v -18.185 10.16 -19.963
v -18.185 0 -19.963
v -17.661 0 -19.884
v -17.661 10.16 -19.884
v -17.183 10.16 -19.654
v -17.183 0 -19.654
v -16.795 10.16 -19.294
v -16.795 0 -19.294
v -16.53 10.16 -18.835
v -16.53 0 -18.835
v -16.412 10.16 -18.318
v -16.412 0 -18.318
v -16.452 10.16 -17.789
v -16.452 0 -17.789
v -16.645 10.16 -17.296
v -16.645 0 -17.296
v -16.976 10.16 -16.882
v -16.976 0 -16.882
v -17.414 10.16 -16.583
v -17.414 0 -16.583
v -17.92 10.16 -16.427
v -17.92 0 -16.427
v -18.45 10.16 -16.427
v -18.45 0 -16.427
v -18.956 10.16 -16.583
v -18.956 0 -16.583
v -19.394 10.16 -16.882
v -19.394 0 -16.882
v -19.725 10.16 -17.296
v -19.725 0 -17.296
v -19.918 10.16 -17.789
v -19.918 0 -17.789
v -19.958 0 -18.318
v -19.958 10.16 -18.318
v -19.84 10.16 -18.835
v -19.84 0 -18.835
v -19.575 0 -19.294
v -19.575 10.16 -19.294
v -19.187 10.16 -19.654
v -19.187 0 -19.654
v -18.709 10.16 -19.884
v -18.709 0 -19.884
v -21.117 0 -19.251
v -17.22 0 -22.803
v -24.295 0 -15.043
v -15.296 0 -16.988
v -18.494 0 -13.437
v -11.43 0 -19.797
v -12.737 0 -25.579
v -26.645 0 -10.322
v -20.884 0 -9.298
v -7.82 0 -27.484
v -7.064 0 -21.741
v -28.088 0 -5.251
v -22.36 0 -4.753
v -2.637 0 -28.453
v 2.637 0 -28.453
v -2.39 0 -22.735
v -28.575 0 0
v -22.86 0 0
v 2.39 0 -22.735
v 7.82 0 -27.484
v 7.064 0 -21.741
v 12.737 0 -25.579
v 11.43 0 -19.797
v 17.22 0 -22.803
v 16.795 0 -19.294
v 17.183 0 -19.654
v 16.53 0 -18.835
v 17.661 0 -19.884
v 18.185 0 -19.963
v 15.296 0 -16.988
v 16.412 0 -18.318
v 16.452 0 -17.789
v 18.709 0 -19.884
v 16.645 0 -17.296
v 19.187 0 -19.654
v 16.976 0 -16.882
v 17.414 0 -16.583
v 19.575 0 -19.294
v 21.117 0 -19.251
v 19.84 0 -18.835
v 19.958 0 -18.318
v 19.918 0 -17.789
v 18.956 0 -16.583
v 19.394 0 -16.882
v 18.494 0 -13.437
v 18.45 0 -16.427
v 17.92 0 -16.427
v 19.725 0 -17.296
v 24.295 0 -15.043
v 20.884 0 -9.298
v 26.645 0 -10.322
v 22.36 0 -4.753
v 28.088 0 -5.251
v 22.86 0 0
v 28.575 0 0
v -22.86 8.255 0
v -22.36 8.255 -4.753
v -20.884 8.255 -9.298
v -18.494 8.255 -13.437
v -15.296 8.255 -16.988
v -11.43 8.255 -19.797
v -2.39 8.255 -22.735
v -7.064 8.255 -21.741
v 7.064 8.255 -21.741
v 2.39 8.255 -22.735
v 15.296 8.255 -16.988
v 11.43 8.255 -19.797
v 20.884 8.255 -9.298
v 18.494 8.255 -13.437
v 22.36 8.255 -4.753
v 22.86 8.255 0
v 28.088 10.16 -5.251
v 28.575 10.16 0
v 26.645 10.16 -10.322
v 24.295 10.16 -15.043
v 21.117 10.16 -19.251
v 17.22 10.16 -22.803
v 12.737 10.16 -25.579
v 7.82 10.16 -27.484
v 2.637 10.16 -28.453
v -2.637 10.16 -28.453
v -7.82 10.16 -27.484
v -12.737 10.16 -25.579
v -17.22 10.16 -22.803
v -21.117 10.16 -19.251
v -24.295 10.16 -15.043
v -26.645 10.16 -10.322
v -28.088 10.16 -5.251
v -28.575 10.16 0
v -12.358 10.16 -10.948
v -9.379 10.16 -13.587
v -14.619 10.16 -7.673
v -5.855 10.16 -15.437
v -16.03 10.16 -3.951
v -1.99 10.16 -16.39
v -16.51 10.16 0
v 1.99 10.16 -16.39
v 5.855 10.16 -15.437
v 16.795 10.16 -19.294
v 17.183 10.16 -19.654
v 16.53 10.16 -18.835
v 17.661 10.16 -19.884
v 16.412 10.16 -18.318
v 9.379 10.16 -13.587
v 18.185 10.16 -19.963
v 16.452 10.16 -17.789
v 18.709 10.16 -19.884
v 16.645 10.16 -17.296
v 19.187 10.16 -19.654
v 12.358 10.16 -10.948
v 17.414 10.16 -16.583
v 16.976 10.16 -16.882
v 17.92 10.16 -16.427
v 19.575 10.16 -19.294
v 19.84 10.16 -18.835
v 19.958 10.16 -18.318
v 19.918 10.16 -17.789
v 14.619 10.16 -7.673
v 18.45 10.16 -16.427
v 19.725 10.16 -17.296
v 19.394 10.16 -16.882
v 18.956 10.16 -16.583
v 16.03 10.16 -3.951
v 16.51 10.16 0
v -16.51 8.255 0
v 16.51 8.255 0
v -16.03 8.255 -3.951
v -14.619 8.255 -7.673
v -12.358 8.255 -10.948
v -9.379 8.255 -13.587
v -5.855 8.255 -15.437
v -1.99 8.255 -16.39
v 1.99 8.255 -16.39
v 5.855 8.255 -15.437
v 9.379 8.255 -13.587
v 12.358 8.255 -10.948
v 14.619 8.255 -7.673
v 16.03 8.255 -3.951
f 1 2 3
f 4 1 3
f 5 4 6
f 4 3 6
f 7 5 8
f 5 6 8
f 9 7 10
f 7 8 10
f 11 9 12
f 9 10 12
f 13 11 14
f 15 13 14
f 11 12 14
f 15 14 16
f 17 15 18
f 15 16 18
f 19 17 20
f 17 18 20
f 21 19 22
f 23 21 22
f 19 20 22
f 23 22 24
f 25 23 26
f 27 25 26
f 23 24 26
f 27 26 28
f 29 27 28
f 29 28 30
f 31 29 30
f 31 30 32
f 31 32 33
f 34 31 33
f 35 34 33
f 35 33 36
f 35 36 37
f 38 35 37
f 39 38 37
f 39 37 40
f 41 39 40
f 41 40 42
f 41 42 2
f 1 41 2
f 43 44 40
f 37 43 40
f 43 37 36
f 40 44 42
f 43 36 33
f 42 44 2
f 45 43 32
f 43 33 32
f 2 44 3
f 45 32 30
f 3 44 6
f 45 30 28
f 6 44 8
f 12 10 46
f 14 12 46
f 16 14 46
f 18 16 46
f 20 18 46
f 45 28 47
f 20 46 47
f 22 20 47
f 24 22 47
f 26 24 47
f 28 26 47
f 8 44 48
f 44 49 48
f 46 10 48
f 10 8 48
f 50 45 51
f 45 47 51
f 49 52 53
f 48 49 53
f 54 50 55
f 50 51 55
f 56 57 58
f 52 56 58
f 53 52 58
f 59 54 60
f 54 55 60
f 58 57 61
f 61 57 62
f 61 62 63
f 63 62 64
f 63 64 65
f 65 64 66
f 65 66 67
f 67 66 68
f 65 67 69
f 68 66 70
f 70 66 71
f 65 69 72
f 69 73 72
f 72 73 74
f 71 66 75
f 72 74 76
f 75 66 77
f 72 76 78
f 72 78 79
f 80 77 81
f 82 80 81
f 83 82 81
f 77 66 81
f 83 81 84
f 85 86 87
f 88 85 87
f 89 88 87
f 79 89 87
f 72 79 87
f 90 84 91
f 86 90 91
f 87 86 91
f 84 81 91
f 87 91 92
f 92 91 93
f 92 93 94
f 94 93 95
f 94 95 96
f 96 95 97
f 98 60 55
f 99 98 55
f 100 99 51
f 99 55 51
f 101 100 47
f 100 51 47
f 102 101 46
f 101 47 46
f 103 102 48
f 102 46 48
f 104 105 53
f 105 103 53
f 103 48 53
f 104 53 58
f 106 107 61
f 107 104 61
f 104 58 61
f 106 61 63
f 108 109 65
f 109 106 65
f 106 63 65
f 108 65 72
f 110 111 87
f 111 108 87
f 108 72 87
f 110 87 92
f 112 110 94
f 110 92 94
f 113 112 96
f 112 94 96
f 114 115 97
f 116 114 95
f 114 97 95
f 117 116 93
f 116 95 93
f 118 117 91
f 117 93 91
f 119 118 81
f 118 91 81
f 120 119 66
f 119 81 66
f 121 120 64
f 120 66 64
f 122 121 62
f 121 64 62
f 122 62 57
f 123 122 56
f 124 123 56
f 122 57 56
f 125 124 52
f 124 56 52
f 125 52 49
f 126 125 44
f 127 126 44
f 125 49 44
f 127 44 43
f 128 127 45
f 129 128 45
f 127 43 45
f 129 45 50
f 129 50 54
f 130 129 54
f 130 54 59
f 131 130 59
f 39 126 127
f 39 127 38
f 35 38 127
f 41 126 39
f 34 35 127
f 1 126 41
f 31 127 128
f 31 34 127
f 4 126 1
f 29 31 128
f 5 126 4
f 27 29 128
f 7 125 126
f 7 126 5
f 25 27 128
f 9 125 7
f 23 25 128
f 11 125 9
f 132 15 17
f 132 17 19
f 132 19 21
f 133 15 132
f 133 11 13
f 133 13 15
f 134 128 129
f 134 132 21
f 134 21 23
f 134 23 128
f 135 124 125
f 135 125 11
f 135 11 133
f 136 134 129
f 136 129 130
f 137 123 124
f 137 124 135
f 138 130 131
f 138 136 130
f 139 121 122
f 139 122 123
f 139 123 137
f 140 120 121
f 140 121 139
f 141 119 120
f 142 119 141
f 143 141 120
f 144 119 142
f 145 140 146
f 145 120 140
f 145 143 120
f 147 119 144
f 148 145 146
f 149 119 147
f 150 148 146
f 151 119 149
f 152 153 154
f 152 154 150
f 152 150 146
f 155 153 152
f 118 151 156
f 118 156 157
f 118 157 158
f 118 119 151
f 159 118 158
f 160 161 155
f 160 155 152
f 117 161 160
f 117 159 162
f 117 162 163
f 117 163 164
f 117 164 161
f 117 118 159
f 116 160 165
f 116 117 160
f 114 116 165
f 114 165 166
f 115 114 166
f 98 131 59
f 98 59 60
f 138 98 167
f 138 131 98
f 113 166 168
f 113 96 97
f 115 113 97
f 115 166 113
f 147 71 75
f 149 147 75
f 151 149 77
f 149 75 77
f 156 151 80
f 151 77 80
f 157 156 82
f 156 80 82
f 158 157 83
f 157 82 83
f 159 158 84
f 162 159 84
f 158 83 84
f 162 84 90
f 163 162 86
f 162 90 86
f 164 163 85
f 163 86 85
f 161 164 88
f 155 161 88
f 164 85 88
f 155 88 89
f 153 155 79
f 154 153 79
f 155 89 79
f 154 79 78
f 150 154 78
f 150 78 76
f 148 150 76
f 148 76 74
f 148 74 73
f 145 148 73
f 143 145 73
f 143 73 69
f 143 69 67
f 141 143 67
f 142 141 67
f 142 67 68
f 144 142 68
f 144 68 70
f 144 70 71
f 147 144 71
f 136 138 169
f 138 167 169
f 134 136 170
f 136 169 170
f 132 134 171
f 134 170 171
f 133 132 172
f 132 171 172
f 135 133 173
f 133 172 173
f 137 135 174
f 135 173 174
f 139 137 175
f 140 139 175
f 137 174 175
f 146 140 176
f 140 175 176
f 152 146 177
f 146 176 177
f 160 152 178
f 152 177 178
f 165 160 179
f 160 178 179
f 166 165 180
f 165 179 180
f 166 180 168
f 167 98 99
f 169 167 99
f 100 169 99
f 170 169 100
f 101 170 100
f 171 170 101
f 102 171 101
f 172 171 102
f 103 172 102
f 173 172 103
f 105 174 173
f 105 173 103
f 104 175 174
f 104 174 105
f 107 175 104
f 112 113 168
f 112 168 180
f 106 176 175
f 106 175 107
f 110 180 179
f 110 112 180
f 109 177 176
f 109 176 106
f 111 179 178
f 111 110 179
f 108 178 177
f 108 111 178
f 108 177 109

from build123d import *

# Parameters (mm, degrees)
SKETCH1_R           = 28.575
BOSS_EXTRUDE1_DEPTH = 10.16
SKETCH2_R           = 16.51
CUT_EXTRUDE1_DEPTH  = 42.66877548
SKETCH3_R           = 22.86
CUT_EXTRUDE2_DEPTH  = 8.255
SKETCH4_W           = 88.915115744
SKETCH4_H           = 51.352535237
CUT_EXTRUDE3_DEPTH  = 42.66877548
CUT_EXTRUDE4_REACH  = 43.669
SKETCH6_R           = 1.778


with BuildPart() as part:
    # Sketch1 → Boss-Extrude1 (new body)
    with BuildSketch(Plane(origin=(0, 0, 0), x_dir=(1, 0, 0), z_dir=(0, 1, 0))):
        with Locations(Location((0, 0, 0), (0, 0, 270))):
            Circle(SKETCH1_R)
    extrude(amount=BOSS_EXTRUDE1_DEPTH)

    # Sketch2 → Cut-Extrude1 (cut, through all)
    with BuildSketch(Plane.XZ):
        with Locations(Location((0, 0, 0), (0, 0, 270))):
            Circle(SKETCH2_R)
    extrude(amount=-CUT_EXTRUDE1_DEPTH, mode=Mode.SUBTRACT)

    # Sketch3 → Cut-Extrude2 (cut)
    with BuildSketch(Plane.XZ):
        with Locations(Location((0, 0, 0), (0, 0, 270))):
            Circle(SKETCH3_R)
    extrude(amount=-CUT_EXTRUDE2_DEPTH, mode=Mode.SUBTRACT)

    # Sketch4 → Cut-Extrude3 (cut, through all)
    with BuildSketch(Plane(origin=(0, 10.16, 0), x_dir=(1, 0, 0), z_dir=(0, 1, 0))):
        with Locations((4.883047594, -25.676267619)):
            Rectangle(SKETCH4_W, SKETCH4_H)
    extrude(amount=-CUT_EXTRUDE3_DEPTH, mode=Mode.SUBTRACT)

    # Sketch6 → Cut-Extrude4 (cut, up to next)
    with BuildSketch(Plane.XZ, mode=Mode.PRIVATE) as cut_extrude4_sk1:
        with Locations(Location((18.185018645, -18.185018645, 0), (0, 0, 270))):
            Circle(SKETCH6_R)
    cut_extrude4_tool1 = extrude(cut_extrude4_sk1.sketch, amount=-CUT_EXTRUDE4_REACH, mode=Mode.PRIVATE) & part.part
    # Sketch6 → Cut-Extrude4 (cut, up to next)
    with BuildSketch(Plane.XZ, mode=Mode.PRIVATE) as cut_extrude4_sk2:
        with Locations(Location((-18.185018645, -18.185018645, 0), (0, 0, 270))):
            Circle(SKETCH6_R)
    cut_extrude4_tool2 = extrude(cut_extrude4_sk2.sketch, amount=-CUT_EXTRUDE4_REACH, mode=Mode.PRIVATE) & part.part
    add(cut_extrude4_tool1.solids().sort_by_distance((18.185019, 0, -18.185019))[0], mode=Mode.SUBTRACT)
    add(cut_extrude4_tool2.solids().sort_by_distance((-18.185019, 0, -18.185019))[0], mode=Mode.SUBTRACT)


solid = part.part
